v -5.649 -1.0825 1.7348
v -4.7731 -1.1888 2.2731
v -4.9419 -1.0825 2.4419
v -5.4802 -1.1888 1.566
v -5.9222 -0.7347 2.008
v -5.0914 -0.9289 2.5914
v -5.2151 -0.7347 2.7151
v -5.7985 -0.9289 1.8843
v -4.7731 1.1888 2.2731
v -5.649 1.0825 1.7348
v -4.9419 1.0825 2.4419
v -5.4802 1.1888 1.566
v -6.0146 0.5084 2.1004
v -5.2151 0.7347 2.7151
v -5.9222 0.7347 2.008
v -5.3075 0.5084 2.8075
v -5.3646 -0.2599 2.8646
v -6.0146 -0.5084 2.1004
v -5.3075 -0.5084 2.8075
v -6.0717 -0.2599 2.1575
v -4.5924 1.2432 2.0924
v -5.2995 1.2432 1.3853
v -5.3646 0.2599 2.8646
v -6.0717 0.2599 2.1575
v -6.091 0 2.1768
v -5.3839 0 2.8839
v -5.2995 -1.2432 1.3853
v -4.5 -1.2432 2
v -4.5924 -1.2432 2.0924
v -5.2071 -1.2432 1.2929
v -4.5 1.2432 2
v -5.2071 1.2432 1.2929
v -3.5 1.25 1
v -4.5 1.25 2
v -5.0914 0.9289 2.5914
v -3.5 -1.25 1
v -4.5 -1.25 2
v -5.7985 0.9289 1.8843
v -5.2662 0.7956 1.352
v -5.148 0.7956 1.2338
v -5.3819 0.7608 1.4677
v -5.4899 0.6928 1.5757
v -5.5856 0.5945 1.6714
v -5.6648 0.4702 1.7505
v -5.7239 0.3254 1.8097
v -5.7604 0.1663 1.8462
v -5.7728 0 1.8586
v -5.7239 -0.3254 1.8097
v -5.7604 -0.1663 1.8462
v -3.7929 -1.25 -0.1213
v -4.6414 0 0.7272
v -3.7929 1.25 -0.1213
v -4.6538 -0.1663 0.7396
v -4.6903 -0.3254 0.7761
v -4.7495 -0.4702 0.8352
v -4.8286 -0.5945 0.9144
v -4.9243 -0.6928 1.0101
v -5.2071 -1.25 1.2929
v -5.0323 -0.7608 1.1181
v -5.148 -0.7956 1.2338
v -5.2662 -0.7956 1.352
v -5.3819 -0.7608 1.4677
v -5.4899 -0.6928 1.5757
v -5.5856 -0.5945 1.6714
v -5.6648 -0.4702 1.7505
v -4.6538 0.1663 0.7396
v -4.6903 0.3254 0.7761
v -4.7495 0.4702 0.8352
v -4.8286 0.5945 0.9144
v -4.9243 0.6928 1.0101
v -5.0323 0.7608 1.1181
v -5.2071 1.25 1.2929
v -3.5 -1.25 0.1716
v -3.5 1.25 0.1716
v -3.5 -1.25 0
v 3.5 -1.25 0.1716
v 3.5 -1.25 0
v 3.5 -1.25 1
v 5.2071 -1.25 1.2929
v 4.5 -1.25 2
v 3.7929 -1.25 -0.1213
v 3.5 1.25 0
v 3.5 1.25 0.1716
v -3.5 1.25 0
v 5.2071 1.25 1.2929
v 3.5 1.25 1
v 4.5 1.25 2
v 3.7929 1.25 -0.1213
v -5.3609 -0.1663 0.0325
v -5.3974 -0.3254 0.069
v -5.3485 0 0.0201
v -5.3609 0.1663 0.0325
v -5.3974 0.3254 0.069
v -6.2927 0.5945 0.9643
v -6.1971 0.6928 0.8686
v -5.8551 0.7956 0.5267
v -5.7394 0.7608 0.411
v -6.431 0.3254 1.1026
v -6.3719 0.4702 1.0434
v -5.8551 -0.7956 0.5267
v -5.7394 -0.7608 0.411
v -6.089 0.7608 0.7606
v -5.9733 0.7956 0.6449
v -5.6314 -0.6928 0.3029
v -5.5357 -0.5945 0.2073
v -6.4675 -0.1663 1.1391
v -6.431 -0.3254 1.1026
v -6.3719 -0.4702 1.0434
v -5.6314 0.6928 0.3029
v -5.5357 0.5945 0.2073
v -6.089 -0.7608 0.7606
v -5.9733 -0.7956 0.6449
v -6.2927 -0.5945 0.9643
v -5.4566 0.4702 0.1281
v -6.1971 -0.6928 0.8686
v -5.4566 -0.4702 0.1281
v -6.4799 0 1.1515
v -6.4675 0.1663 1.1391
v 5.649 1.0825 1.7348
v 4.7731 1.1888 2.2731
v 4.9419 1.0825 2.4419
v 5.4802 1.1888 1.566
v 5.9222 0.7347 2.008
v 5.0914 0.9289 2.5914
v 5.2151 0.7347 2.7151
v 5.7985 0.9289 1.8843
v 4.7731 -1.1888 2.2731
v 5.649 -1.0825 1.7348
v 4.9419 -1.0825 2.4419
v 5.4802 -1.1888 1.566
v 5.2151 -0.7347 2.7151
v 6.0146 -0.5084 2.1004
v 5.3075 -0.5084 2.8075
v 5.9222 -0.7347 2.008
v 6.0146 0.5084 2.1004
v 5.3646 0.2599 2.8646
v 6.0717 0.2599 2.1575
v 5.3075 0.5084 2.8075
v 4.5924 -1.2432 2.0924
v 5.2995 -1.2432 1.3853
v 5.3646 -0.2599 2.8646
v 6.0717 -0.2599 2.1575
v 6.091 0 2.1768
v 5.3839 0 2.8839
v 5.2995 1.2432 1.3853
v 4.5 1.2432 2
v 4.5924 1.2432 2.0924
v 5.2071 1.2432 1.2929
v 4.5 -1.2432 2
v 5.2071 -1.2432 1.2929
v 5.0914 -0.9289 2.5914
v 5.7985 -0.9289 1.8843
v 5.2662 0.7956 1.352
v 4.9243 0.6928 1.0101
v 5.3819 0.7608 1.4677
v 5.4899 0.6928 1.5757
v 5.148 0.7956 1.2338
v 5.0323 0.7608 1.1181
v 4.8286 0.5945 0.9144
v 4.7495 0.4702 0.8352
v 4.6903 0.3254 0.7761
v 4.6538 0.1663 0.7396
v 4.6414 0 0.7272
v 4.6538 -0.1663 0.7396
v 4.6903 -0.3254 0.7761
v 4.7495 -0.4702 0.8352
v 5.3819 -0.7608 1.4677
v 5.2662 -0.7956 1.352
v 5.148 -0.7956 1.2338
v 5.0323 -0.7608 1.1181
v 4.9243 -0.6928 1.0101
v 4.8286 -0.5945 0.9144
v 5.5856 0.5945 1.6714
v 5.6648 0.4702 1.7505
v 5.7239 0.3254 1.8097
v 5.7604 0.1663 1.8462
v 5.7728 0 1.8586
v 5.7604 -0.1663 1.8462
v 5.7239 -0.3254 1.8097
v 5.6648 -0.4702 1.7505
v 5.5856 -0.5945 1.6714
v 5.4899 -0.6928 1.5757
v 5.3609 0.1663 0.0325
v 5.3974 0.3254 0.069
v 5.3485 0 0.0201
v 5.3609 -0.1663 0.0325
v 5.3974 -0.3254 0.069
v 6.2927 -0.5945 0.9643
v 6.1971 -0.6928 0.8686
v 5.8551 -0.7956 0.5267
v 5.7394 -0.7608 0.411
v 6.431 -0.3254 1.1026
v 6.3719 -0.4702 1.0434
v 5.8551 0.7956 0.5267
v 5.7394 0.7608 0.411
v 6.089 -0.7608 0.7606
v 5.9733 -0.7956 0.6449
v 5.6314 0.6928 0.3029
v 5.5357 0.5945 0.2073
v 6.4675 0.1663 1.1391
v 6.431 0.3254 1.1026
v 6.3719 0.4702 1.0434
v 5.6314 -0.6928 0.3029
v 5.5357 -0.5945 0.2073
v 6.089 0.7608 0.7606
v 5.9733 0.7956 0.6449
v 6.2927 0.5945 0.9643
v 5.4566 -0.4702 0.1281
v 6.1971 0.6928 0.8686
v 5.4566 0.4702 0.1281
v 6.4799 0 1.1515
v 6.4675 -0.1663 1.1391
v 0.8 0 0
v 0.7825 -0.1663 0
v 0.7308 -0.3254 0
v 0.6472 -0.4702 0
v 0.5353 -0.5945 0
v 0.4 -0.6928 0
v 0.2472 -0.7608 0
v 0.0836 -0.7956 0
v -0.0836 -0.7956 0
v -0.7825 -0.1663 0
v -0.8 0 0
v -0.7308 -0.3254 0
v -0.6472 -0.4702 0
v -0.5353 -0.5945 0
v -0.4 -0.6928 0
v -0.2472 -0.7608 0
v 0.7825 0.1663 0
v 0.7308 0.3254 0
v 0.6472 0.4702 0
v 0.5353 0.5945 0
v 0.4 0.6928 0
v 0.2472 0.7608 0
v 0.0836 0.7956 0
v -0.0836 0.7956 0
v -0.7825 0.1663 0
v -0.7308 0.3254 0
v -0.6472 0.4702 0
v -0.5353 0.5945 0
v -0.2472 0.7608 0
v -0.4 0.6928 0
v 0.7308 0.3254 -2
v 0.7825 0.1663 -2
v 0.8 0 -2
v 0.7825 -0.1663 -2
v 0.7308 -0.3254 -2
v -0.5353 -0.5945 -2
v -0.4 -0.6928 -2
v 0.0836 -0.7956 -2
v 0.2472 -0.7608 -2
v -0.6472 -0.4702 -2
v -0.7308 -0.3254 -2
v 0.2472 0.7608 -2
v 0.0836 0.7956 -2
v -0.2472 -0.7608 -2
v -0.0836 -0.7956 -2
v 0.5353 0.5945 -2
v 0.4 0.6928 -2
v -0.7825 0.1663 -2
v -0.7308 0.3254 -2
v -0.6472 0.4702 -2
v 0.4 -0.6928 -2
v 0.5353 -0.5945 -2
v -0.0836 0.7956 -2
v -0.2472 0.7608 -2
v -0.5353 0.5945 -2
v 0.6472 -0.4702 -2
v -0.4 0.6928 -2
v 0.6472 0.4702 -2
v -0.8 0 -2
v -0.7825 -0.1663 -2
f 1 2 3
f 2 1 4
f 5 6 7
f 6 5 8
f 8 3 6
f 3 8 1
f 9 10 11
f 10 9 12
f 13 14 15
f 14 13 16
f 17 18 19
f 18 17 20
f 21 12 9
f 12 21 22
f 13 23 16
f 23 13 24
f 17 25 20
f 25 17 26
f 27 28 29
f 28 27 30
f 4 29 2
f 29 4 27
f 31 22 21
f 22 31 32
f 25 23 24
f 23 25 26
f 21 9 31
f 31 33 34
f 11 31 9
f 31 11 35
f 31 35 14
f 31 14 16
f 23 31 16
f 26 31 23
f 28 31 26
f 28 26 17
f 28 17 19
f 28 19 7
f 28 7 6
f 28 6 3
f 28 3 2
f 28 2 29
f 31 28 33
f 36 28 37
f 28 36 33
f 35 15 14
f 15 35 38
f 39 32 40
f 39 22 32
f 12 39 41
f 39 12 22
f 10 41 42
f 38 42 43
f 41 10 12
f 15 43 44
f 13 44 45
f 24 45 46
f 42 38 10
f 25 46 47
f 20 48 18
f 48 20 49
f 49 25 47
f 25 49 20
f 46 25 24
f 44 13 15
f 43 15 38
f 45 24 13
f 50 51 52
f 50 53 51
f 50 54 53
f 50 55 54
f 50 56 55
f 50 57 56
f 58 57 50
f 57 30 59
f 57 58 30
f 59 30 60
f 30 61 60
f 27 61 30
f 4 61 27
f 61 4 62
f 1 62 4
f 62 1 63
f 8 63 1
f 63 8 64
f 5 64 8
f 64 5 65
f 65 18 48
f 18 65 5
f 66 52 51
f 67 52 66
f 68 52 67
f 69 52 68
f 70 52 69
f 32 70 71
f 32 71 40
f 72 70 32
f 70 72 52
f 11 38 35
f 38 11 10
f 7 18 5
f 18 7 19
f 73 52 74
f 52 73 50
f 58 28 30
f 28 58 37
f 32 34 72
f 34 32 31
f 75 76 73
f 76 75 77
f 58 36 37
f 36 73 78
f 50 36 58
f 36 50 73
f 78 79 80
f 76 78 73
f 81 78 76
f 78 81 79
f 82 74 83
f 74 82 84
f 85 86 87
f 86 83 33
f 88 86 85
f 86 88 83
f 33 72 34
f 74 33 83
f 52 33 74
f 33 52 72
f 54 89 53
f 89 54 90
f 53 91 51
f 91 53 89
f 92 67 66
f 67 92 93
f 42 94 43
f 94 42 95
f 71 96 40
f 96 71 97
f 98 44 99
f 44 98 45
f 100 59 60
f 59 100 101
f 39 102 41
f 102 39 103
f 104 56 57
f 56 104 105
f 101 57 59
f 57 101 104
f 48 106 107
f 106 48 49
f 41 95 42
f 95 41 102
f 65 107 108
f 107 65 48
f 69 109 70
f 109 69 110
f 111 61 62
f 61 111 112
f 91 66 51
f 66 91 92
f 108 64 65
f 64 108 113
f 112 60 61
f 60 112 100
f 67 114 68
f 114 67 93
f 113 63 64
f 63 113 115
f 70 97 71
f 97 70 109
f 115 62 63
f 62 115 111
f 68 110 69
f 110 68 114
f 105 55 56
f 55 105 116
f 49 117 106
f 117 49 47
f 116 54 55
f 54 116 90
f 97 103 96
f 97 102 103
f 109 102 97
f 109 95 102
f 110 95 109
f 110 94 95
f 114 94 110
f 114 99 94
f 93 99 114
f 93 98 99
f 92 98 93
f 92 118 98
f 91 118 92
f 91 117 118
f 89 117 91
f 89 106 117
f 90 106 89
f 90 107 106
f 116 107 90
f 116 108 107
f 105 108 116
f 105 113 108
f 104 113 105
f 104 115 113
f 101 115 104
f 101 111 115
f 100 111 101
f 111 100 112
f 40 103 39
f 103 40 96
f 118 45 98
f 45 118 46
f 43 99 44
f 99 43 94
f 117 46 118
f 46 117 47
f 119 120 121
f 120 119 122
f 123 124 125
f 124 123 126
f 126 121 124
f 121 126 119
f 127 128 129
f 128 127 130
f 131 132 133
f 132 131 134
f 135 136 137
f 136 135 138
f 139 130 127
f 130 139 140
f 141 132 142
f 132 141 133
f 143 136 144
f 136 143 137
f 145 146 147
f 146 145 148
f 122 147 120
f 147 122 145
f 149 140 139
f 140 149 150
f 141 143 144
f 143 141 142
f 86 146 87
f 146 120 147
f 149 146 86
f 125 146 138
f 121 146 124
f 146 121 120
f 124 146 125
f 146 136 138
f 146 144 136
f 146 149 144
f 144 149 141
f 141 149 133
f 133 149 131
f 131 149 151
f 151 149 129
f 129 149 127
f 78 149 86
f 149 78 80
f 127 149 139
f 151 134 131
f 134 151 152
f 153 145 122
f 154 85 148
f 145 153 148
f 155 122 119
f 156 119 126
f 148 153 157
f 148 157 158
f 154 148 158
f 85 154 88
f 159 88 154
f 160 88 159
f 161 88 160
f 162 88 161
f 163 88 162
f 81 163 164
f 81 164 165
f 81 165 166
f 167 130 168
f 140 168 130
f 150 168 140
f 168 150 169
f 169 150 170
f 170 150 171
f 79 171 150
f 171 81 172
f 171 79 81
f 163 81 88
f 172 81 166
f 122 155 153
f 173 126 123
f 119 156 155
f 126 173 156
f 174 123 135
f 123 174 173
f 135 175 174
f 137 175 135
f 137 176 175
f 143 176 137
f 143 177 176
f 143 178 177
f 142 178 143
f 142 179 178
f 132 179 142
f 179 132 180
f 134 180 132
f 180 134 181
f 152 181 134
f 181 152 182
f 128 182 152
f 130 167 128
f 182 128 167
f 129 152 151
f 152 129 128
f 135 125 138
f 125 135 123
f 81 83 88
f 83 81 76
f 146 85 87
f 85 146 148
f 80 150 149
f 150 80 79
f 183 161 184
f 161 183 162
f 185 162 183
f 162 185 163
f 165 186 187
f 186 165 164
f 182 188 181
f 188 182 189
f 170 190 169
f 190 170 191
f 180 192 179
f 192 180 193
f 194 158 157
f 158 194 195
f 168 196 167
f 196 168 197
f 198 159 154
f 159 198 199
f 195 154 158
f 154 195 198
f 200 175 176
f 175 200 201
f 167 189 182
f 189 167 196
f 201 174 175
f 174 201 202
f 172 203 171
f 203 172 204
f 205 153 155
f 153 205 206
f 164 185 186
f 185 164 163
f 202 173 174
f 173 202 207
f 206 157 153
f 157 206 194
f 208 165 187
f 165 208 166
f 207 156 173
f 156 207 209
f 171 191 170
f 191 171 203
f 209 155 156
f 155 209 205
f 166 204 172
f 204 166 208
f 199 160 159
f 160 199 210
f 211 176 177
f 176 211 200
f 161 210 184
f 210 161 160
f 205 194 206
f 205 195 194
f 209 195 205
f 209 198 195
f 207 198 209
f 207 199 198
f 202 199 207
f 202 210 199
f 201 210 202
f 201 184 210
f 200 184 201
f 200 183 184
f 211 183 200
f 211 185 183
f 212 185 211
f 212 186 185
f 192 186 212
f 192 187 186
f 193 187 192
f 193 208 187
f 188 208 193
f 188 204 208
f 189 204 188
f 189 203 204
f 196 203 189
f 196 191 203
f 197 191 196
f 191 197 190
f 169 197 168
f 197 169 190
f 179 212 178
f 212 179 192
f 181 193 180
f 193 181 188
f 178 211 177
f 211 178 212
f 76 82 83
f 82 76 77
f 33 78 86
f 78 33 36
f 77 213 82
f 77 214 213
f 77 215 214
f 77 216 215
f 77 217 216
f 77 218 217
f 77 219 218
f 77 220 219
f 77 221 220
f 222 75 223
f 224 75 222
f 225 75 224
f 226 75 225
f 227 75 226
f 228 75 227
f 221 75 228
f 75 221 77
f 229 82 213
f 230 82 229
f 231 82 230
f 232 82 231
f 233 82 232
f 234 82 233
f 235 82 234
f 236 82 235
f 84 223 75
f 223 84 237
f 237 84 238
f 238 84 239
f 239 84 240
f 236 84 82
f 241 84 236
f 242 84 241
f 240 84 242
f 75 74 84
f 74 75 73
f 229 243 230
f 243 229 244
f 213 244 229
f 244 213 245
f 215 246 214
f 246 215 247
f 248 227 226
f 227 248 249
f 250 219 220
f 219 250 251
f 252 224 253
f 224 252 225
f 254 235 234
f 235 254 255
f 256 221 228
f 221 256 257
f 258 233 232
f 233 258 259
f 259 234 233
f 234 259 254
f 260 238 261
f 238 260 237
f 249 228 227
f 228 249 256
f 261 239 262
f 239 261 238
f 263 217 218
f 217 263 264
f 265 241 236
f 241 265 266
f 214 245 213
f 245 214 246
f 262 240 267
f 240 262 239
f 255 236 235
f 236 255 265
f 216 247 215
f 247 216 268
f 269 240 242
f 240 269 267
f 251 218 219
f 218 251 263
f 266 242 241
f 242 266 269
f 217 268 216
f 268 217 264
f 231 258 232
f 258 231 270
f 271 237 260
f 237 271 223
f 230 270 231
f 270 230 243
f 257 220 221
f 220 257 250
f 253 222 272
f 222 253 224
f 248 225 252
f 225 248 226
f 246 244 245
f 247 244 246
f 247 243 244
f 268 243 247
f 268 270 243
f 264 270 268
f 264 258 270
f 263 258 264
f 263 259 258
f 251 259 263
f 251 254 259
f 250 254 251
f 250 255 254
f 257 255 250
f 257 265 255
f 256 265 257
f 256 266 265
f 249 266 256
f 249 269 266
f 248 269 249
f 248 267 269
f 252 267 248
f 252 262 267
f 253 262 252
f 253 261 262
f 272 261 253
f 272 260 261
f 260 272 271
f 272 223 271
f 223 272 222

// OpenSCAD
$fn =30;
module peghole(){
    color("Blue")cylinder (6, .8, .8, true);
}
// the peg hole template, a change in size here changes hole everywhere
module peg(){
    cylinder (2, .8, .8);
}

module edge(){
cylinder (5, 3.25, 3.25, true);
}
// a cylinder for making block


module block(){
    intersection(){
edge();
rotate([90,0,0]) edge();
rotate([0, 90, 0]) edge();
}
}
// create the base cube without the holes


module blox(){
difference(){ 
block();
   peghole();
rotate ([90, 0, 0]) peghole();
rotate ([0, 90, 0]) peghole();
}
}
//unembeleshed blox cube

module cross(){
blox();
translate([5,0,0]) blox();
translate([-5,0,0]) blox();
translate([0,0,5]) blox();
translate([0,0,-5]) blox();
}
// central blox cross

module corner(){difference(){
    block();
   translate([-3,-3,3])rotate([0,45,0])
cube([8,6
   ,4]) color("Red");
 rotate([0,90,0])
   translate([0,0,-4]) peghole();
 translate([0,0,-4]) peghole();   
 rotate([0,45,0]) translate([0,0,1])peghole();   
}
}
    
//anled blox piece

module side(){
    blox();
    translate([0,0,5])corner();
translate([0,0,-5]) rotate([0,90,0]) corner();
}
// Pentagram side of octagon, can be own piece

module 3long() {
    blox();
    translate([0,0,5]) blox();
    translate([0,0,-5]) blox();
}

module opcorner(){
    translate([5,0,5]) corner();
translate([-5,0,-5]) rotate([0,180,0])corner();
}
// unused now

module oct() {
3long();
translate([5,0,0]) side();
translate([-5,0,0]) rotate([0,180,0]) side();
}
// one octagon of blox, can be used as own piece

module longside() {
side();
translate([0,5,0]) side();
translate([0,-5,0]) side();
}
// long side can be used as own piece

module hexlong(){
longside();
translate([-5,0,0]) rotate([0,180,0]) longside();
}
// long side in the combined form, usable as piece

module 3X3() {
3long();
translate([0,5,0]) 3long();
translate([0,-5,0]) 3long();
}
// plate of 3X3 blox can be used as own piece

module long(){
    oct();
translate([0,5,0]) oct();
translate([0,-5,0]) oct();
}
// octoganal tube with solid fill

module longhollow(){
difference(){
long();
cube([10,10,5], true);
cube([5,10,10], true);
}
}
// lighter octoganal tube

module test(){
translate([0,0,10]) blox();
rotate([0,45,0]) translate([0,0,9.5]) blox();
}
// set up angle for bracket design
module core() {
    color("Red") translate([0,0,2.5]) blox();
    color("Red");
}
// a test blox to position in cap
module caplower(){
CapPoints = [ [0,7.5,0],[5,2.5,0],[5,-2.5,0],[0,-7.5,0],[0,2.35,4.6],[2.35,2.35,4.6],[2.35,-2.35,4.6],[0,-2.35,4.6] ];
CapFaces = [ [0,1,2,3],[1,0,5],[3,2,6],[3,6,7],[3,7,4,0],[2,1,5,6],[5,4,7,6],[4,5,0] ];
polyhedron(CapPoints, CapFaces,convexity = 1);
}
// creates a cap with a petruding blox, needs finetuning
module halfflatcap() {
    CapPoints = [ [0,7.5,0],[5,2.5,0],[5,-2.5,0],[0,-7.5,0],[0,2.5,5],[2.5,2.5,5],[2.5,-2.5,5],[0,-2.5,5] ];
CapFaces = [ [3,2,1,0],[5,0,1],[6,2,3],[7,6,3],[0,4,7,3],[6,5,1,2],[6,7,4,5],[0,5,4] ];
difference(){
    polyhedron(CapPoints, CapFaces,convexity = 1);
translate([2.5,0,-1]) peghole();
translate([0,0,4]) peghole();
}
}
// make half a cao for hex with sides flush with top of blox
module fulflatcap() {
    halfflatcap();
rotate ([0,0,180]) halfflatcap();
}

// make cap for hex with sides flush with top of blox
module bracketbase(){
    difference(){
rotate([0,30,0])translate([1,0,-1]) cube([5,3,5], true);
translate([-2.5,0,-10]) test();
 translate([-4,-3,-3])cube([3,5,5]);translate([-.5,0,-4.5])rotate([0,30,0]) cube(4.1, true);translate([-4,-2,-5])cube(4);    
  }
}
// bracket for between wings
//difference(){
module wingspots(){
    rotate([0,-90,0]) side();
translate([0,0,-5])
union(){
   test();
rotate([0,0,180]) test();

}
}
// test of wing spots,
//why does diference with core not work

module test2() {
difference(){
    wingspots();
translate([0,0,5
   ]) cube(5.005
   ,true);
    //messing with a hairs breadth as blox() ads a tiny hight change
}
//blox();
}
// test for bracket between octagon angles
module bracketend(){
cylinder(2.75,1.25,1.25);
translate([0,-1.25,0]) cube([2,2.5,1]);
}
module bracketendb(){
cylinder(1,1.25,1.25);
translate([0,-1.25,0]) cube([2,2.5,1]);
    peg();
}
module bracketpegs() {
    translate([-4.5,0,2]) rotate ([180,45,0]) bracketendb();
translate([4.5,0,2]) rotate ([0,135,0]) bracketendb();
translate([0,0,.5]) cube([7,2.5,1], true);
translate([0,0,-2]) peg();
}
bracketpegs();
